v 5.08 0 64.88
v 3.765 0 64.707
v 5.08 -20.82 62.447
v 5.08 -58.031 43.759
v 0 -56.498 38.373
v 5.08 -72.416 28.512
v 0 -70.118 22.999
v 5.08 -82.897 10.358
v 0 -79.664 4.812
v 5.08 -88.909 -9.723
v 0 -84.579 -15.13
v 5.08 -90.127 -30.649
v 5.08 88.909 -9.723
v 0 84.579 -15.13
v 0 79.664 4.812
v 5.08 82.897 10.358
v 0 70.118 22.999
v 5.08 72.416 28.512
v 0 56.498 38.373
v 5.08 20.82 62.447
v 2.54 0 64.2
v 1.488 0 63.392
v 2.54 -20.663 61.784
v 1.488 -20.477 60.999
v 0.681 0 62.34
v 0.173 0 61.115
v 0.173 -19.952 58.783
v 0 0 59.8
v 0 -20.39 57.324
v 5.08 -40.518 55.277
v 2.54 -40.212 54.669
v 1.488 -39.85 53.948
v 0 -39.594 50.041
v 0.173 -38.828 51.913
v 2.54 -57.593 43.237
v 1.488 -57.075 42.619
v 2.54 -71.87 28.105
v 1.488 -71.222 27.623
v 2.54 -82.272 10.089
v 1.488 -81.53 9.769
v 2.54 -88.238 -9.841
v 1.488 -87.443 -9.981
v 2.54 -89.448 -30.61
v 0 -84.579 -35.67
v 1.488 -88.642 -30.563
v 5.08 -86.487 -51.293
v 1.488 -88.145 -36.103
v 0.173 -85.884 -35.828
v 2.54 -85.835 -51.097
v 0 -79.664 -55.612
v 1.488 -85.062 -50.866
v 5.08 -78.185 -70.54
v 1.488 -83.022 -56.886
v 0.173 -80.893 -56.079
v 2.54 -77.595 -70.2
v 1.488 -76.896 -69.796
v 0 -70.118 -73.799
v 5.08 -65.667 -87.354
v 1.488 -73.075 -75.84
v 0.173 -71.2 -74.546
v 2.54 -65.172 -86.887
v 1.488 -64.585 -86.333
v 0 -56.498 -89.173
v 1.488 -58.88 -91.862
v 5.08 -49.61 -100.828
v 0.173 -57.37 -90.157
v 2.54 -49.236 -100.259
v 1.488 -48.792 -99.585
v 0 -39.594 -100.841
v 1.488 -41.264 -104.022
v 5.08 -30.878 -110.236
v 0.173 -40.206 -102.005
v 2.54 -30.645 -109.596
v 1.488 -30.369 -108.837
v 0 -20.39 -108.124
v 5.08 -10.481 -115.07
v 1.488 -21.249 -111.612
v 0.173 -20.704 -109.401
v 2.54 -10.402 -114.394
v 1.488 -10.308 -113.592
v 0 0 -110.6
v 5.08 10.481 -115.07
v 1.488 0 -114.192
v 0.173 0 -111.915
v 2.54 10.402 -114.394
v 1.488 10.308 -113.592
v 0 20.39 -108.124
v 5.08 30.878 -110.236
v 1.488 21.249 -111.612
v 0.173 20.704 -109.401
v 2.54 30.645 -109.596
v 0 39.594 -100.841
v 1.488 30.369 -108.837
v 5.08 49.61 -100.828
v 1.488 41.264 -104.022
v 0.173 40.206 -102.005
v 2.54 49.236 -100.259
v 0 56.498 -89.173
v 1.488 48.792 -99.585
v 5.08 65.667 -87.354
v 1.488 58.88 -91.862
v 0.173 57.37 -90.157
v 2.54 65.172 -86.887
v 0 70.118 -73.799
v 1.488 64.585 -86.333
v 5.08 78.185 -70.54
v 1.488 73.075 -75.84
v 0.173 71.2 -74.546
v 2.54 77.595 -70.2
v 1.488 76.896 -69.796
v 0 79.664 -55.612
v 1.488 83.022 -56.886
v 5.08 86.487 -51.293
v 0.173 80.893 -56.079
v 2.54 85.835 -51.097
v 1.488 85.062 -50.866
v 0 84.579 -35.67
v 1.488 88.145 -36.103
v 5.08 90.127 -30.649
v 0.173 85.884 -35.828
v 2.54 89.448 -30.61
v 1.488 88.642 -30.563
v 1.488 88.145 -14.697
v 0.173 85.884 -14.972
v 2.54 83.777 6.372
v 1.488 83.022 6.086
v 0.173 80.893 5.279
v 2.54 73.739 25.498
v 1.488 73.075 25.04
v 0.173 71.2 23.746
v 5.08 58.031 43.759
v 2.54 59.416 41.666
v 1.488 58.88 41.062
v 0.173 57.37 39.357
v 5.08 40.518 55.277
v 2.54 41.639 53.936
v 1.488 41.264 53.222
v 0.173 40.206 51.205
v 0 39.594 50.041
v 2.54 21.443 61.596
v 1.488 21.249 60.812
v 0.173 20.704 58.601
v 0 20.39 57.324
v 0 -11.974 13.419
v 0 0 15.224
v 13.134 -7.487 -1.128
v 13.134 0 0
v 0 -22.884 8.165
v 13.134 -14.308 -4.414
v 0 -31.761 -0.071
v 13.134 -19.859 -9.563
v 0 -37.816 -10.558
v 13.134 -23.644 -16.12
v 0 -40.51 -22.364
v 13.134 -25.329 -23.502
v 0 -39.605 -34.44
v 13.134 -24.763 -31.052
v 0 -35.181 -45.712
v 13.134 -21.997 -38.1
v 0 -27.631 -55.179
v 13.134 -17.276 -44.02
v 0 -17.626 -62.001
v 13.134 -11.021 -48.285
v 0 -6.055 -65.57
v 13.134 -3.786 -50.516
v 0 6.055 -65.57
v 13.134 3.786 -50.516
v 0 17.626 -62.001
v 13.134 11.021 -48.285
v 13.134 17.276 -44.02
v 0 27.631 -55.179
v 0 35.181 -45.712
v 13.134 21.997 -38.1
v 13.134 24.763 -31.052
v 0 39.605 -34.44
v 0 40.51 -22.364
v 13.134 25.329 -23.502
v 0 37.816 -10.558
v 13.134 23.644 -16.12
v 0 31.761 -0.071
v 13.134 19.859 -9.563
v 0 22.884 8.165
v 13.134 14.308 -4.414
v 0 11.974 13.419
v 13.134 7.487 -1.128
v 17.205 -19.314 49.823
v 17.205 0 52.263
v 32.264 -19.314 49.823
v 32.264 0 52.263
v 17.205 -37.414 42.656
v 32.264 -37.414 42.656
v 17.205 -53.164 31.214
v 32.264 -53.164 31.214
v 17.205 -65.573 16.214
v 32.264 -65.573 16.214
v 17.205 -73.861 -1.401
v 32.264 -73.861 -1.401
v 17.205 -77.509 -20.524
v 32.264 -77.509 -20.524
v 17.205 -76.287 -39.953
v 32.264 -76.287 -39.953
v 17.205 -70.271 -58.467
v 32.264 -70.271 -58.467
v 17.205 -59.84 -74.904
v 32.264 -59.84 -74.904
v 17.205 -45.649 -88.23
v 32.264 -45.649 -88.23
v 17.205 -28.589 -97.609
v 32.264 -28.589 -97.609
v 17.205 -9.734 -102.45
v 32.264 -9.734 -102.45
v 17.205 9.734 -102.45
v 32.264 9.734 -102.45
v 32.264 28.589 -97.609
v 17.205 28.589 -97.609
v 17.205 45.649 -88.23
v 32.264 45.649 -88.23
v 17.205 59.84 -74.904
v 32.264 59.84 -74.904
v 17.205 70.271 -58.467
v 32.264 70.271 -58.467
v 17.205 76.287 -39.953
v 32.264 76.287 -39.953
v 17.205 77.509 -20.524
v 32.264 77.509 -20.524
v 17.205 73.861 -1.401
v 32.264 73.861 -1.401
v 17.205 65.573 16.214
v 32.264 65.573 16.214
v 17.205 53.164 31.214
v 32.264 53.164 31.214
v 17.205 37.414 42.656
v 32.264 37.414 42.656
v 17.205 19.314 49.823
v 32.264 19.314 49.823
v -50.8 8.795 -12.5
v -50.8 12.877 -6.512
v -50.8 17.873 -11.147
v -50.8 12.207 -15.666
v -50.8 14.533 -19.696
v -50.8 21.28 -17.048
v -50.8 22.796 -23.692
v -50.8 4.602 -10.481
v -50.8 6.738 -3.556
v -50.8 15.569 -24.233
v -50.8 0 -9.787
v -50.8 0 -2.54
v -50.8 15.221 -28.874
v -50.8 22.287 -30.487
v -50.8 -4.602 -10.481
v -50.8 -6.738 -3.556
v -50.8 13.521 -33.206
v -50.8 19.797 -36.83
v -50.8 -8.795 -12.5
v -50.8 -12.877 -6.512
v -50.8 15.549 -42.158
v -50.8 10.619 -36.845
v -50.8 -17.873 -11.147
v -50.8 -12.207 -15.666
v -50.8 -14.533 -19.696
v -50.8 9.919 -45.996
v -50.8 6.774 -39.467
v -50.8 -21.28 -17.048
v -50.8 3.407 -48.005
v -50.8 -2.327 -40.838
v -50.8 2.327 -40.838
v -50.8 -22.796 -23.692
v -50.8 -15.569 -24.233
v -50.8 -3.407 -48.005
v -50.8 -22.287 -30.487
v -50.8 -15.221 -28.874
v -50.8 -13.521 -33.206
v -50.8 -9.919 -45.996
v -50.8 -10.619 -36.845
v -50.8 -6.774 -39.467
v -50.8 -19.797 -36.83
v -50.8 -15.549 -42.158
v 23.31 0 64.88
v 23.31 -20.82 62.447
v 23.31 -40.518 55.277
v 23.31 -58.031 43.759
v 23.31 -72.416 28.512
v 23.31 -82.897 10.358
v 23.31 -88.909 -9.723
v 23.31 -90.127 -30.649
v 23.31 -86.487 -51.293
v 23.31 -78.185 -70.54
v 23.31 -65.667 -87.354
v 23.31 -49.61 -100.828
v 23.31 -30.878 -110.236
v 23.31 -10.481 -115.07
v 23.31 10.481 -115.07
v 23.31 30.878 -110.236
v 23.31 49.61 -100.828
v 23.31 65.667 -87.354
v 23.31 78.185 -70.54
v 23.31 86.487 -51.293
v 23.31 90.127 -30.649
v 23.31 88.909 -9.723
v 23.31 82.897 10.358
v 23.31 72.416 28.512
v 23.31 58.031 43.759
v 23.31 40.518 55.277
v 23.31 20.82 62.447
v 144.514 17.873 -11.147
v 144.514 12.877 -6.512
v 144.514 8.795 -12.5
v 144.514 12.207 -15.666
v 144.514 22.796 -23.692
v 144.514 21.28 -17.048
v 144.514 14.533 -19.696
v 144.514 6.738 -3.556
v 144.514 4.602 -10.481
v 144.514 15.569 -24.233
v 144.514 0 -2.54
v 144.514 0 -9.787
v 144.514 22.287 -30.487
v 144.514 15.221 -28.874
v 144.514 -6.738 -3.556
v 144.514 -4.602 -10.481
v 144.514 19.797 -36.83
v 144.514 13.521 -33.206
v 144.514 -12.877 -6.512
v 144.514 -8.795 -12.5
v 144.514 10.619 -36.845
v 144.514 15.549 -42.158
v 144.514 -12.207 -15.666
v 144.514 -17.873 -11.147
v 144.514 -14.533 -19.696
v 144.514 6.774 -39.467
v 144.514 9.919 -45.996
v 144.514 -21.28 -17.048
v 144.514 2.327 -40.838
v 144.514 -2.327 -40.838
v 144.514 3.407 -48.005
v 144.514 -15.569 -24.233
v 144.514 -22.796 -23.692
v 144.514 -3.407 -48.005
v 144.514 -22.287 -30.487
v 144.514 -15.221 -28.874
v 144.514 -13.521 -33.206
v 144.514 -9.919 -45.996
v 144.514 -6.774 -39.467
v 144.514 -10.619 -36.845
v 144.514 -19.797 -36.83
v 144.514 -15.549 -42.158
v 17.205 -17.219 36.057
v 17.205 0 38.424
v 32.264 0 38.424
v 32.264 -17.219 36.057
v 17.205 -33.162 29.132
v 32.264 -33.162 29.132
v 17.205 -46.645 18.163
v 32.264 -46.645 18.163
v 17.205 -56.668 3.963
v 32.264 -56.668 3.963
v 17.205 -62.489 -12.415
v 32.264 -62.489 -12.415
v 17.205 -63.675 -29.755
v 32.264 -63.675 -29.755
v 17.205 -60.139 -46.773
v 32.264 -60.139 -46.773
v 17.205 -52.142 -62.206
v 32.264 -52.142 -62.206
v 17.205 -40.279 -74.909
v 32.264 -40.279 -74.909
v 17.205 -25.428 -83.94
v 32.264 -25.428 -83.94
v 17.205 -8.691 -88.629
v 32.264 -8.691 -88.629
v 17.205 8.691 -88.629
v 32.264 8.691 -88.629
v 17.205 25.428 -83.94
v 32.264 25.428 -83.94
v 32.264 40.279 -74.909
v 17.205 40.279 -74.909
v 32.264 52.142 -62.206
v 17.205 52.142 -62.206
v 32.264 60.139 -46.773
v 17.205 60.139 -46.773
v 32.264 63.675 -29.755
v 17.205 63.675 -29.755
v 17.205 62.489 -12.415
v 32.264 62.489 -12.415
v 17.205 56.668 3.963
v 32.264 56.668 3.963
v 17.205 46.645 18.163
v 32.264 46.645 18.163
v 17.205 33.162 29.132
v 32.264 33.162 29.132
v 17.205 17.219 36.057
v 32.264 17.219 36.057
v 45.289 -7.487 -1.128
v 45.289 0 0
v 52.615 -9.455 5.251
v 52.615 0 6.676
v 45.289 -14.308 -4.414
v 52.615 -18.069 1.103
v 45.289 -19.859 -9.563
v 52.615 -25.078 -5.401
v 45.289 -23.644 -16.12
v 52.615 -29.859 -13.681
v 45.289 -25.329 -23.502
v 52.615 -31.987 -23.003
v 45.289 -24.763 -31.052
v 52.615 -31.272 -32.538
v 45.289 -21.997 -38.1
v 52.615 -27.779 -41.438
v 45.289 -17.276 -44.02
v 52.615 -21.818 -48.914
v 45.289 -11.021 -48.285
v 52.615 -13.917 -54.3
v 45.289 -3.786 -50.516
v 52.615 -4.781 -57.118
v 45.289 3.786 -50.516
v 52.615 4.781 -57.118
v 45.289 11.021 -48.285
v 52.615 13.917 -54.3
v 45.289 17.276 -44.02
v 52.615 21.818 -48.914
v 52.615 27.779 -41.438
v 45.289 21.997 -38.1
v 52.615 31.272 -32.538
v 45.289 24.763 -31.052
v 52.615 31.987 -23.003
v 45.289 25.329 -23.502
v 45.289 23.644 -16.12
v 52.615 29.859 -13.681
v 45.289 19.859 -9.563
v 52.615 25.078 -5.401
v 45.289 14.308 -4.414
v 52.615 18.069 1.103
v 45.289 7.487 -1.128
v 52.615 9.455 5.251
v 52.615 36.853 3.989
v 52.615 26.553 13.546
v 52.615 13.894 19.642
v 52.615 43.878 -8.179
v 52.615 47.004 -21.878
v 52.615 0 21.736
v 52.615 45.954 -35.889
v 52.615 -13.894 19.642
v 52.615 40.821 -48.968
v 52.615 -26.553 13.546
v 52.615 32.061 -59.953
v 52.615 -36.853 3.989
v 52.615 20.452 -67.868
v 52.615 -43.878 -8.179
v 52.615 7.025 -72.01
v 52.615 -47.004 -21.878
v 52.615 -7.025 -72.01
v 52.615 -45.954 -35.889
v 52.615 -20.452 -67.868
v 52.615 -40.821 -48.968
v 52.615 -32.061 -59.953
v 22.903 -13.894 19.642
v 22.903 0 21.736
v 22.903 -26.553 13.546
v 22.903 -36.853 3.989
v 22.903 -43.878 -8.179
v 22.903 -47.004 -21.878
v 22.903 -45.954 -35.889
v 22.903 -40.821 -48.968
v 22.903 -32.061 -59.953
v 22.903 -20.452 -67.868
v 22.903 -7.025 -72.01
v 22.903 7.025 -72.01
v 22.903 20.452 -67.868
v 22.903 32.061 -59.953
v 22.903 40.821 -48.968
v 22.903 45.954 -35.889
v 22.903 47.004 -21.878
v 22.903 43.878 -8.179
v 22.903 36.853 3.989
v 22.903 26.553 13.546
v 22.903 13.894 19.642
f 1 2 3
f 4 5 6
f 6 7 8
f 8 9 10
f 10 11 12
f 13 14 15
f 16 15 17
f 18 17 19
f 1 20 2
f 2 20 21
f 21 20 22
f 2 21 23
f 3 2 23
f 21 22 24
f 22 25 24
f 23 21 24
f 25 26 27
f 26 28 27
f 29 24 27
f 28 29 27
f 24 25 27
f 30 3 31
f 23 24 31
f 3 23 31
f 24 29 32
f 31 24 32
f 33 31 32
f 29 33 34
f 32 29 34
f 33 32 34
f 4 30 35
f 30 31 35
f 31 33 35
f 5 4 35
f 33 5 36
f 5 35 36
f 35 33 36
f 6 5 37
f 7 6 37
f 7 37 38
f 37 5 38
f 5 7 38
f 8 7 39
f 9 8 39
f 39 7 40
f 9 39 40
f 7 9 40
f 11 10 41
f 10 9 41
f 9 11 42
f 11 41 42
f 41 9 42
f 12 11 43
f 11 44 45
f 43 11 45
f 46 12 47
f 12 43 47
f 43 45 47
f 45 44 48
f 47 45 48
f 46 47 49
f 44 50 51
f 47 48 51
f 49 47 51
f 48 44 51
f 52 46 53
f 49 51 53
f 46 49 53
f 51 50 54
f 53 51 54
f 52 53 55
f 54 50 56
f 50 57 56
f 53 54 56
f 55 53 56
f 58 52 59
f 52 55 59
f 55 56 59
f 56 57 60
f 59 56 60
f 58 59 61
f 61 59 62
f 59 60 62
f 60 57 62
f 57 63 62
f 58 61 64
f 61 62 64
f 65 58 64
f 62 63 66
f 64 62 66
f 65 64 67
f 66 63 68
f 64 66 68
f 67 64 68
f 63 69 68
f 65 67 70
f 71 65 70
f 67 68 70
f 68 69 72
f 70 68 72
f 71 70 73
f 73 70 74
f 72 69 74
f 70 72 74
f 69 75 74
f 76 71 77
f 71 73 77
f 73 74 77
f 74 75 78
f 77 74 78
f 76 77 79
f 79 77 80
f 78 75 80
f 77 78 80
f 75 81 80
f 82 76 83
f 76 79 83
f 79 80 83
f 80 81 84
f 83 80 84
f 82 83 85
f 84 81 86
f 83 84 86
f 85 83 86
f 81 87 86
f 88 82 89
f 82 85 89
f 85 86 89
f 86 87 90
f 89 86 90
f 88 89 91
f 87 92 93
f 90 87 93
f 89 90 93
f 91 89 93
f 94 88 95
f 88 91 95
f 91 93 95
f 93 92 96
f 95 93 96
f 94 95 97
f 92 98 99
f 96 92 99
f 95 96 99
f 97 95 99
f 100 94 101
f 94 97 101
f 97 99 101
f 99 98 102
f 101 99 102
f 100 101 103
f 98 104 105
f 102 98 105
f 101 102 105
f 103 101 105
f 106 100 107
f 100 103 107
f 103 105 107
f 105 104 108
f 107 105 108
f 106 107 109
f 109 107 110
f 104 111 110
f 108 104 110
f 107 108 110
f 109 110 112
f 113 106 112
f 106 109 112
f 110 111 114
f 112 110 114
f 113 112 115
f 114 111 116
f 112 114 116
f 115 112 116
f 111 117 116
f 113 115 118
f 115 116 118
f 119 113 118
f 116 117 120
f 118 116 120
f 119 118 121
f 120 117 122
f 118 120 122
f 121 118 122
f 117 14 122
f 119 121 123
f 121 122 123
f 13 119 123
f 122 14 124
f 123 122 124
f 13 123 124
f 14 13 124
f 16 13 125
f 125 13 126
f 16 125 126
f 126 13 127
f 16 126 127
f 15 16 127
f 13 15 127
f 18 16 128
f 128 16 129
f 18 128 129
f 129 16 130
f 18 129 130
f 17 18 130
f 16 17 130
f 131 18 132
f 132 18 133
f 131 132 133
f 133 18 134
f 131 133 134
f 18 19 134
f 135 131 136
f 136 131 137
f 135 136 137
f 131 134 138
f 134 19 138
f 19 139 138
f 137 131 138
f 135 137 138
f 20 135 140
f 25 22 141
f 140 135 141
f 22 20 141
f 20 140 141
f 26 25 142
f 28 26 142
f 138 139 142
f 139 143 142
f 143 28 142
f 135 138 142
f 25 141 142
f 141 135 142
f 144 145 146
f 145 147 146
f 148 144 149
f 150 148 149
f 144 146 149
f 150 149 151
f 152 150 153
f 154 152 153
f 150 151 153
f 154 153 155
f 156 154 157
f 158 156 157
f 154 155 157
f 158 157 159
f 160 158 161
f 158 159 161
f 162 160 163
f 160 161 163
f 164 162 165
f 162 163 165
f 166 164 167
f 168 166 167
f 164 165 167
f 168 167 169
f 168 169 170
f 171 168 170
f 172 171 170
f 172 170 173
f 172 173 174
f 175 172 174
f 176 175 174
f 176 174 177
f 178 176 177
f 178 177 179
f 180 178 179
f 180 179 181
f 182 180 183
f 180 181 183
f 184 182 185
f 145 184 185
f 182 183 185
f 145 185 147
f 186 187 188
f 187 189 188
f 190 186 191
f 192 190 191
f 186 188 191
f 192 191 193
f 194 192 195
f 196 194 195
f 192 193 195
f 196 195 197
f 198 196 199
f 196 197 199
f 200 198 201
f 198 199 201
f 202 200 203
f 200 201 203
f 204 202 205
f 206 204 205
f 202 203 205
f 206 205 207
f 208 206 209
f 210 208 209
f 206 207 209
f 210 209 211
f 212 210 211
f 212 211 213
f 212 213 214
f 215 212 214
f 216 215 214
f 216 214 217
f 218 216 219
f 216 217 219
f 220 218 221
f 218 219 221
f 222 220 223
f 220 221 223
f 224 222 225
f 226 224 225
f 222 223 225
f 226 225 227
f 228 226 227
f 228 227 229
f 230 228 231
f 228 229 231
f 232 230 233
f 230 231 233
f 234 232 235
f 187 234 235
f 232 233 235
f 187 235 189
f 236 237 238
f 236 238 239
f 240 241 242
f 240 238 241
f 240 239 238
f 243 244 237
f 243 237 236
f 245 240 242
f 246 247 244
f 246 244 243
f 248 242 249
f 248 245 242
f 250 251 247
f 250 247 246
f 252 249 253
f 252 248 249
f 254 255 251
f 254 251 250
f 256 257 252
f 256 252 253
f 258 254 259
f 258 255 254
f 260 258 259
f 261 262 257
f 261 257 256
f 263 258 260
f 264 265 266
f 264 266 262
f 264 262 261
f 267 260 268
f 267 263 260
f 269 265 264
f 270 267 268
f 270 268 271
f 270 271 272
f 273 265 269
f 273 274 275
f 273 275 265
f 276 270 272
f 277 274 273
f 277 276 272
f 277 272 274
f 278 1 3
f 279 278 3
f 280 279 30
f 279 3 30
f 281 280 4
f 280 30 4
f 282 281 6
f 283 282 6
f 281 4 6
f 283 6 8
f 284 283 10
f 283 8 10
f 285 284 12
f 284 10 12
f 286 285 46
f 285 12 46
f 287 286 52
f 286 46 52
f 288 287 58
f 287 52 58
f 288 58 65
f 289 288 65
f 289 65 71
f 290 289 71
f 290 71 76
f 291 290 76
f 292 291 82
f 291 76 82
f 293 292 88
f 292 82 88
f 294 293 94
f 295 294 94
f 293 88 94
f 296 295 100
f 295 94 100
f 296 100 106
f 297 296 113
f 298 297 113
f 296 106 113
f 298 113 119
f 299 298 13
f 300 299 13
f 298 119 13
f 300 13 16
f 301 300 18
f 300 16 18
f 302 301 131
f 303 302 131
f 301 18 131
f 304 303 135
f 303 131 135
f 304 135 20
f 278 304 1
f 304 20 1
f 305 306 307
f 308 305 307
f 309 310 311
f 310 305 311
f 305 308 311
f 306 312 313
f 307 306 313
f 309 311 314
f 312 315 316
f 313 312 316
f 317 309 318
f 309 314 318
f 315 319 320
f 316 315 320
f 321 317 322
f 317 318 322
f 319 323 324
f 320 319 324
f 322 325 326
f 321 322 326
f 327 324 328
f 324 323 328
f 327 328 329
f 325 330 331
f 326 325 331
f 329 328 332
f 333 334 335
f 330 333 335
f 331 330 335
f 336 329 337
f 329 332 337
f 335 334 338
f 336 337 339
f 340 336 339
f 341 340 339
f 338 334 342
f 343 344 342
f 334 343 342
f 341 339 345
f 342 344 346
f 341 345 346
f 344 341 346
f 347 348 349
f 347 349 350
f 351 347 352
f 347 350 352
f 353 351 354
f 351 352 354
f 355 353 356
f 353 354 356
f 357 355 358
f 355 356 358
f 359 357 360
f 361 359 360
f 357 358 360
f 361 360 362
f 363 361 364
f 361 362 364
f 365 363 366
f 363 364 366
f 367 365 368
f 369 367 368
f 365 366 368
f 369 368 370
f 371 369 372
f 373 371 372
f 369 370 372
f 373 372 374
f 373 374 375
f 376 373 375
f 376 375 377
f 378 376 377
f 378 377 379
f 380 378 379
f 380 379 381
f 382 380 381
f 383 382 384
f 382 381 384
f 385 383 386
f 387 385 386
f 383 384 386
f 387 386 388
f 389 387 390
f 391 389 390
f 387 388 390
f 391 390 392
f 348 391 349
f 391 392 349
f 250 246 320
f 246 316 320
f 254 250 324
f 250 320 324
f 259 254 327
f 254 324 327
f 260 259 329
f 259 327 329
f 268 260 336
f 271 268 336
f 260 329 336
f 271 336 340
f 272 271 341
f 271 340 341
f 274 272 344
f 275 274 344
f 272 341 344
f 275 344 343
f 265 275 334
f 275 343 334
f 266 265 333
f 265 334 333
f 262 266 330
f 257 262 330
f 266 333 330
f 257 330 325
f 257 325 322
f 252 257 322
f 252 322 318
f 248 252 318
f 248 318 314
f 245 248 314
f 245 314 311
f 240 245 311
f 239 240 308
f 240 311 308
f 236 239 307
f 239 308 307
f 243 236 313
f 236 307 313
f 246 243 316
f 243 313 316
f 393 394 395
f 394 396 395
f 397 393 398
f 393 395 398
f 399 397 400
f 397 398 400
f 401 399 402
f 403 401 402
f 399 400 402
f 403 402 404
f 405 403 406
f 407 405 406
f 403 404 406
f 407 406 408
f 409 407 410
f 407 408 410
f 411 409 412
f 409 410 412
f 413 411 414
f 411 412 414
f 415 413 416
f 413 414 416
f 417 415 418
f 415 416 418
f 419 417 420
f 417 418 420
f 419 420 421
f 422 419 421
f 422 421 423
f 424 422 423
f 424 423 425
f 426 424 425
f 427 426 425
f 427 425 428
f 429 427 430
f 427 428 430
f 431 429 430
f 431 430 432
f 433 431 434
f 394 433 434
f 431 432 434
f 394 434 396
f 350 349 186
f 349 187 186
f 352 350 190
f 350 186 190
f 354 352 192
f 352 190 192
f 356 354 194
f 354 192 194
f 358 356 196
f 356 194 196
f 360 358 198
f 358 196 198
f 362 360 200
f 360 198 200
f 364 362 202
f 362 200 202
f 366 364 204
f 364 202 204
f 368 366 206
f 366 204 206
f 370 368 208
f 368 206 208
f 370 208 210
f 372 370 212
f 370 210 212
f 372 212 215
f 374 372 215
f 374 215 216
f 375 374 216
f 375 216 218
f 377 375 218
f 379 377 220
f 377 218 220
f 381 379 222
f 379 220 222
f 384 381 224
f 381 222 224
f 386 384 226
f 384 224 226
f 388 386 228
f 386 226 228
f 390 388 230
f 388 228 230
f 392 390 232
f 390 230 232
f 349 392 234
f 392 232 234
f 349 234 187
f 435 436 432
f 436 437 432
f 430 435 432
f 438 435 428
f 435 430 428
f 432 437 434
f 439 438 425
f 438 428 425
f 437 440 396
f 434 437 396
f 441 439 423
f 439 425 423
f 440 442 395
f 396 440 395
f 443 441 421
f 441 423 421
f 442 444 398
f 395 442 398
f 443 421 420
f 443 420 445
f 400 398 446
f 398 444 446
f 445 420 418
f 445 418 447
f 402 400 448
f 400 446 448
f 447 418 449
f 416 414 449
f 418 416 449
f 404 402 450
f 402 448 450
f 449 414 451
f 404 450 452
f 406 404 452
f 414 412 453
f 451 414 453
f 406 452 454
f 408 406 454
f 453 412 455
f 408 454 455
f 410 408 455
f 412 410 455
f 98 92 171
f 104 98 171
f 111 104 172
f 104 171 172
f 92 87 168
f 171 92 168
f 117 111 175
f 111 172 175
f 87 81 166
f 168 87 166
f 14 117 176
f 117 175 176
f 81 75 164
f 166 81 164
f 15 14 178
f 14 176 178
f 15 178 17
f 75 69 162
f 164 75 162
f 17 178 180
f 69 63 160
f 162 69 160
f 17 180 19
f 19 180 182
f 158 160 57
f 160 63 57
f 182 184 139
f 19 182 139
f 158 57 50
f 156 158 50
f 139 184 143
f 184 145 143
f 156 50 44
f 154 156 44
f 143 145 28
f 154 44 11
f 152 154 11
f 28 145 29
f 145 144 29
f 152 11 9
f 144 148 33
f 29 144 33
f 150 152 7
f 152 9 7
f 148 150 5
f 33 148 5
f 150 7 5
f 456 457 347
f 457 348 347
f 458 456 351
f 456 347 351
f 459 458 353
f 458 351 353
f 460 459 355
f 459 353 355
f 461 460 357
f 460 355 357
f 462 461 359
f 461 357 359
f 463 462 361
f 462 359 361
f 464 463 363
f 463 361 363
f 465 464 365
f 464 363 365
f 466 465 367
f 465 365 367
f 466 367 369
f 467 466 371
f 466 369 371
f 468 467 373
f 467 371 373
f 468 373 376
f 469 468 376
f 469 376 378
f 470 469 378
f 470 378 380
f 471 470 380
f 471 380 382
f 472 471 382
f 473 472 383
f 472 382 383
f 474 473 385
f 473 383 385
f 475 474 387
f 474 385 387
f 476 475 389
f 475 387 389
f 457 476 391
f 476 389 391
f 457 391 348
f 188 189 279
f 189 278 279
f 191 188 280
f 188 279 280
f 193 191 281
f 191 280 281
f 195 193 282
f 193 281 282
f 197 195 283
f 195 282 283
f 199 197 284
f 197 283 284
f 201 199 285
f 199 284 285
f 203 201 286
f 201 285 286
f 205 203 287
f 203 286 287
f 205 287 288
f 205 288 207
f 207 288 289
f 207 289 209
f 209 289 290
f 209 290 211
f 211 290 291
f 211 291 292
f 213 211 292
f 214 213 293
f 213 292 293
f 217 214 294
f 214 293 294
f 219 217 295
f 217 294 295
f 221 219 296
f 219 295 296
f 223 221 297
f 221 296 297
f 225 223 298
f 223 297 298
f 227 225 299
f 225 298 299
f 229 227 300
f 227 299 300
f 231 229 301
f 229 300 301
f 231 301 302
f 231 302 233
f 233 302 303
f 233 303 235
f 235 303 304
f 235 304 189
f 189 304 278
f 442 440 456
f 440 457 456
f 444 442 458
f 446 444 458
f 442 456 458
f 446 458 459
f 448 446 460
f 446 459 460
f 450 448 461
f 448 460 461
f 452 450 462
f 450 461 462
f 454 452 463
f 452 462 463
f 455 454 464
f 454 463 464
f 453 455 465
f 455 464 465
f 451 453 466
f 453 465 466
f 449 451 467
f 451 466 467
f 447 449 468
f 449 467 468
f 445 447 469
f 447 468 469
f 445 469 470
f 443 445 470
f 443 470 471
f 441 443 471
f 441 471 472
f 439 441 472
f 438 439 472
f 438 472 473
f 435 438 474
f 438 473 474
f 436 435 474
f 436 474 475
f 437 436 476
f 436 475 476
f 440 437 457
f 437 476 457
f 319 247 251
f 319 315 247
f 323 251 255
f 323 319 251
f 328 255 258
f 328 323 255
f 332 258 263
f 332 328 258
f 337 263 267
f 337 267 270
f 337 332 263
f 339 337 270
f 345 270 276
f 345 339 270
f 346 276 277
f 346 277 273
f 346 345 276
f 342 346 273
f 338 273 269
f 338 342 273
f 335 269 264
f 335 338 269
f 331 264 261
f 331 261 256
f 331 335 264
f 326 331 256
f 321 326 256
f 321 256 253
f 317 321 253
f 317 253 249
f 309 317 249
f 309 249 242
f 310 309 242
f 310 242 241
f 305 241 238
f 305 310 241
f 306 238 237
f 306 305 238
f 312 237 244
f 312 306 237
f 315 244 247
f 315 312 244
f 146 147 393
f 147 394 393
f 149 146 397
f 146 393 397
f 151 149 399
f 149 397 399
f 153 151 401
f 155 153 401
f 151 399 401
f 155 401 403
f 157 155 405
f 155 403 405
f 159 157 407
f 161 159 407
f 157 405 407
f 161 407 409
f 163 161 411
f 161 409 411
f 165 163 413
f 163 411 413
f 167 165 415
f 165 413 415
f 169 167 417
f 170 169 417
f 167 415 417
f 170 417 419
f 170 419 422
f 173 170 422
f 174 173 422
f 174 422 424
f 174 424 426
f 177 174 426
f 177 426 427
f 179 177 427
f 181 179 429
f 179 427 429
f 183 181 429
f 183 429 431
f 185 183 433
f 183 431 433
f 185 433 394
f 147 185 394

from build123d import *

# Parameters (mm, degrees)
F2_W = 195.3139863908
F2_H = 7.2472691536
F4_R = 5.08


with BuildPart() as f1:
    # F0 (on Front) → F1 (revolve)
    with BuildSketch(Plane.XZ):
        Polygon((0, 15.2238626033), (13.1343295798, 0), (45.2888123691, 0), (52.6151545346, 6.6764671355), (52.6151545346, 21.7361617833), (22.9027811438, 21.7361617833), (17.2045174986, 38.4239330888), (32.264214009, 38.4239330888), (17.2045174986, 52.262570709), (32.264214009, 52.262570709), (23.3097989112, 64.8801550269), (0, 64.8801550269), align=None)
    revolve(axis=Axis((35.5203598738, 0, -25.4), (1, 0, 0)))

    # F4
    f4_edges = [f1.edges().sort_by_distance(p)[0] for p in [
        (0, 0, -115.680155),
    ]]
    fillet(f4_edges, radius=F4_R)


with BuildPart() as f3:
    # F2 (on Front) → F3 (revolve)
    with BuildSketch(Plane.XZ):
        with Locations((46.8569931954, -6.1636345768)):
            Rectangle(F2_W, F2_H)
    revolve(axis=Axis((35.5203598738, 0, -25.4), (1, 0, 0)))


solid = Compound([f1.part, f3.part])
